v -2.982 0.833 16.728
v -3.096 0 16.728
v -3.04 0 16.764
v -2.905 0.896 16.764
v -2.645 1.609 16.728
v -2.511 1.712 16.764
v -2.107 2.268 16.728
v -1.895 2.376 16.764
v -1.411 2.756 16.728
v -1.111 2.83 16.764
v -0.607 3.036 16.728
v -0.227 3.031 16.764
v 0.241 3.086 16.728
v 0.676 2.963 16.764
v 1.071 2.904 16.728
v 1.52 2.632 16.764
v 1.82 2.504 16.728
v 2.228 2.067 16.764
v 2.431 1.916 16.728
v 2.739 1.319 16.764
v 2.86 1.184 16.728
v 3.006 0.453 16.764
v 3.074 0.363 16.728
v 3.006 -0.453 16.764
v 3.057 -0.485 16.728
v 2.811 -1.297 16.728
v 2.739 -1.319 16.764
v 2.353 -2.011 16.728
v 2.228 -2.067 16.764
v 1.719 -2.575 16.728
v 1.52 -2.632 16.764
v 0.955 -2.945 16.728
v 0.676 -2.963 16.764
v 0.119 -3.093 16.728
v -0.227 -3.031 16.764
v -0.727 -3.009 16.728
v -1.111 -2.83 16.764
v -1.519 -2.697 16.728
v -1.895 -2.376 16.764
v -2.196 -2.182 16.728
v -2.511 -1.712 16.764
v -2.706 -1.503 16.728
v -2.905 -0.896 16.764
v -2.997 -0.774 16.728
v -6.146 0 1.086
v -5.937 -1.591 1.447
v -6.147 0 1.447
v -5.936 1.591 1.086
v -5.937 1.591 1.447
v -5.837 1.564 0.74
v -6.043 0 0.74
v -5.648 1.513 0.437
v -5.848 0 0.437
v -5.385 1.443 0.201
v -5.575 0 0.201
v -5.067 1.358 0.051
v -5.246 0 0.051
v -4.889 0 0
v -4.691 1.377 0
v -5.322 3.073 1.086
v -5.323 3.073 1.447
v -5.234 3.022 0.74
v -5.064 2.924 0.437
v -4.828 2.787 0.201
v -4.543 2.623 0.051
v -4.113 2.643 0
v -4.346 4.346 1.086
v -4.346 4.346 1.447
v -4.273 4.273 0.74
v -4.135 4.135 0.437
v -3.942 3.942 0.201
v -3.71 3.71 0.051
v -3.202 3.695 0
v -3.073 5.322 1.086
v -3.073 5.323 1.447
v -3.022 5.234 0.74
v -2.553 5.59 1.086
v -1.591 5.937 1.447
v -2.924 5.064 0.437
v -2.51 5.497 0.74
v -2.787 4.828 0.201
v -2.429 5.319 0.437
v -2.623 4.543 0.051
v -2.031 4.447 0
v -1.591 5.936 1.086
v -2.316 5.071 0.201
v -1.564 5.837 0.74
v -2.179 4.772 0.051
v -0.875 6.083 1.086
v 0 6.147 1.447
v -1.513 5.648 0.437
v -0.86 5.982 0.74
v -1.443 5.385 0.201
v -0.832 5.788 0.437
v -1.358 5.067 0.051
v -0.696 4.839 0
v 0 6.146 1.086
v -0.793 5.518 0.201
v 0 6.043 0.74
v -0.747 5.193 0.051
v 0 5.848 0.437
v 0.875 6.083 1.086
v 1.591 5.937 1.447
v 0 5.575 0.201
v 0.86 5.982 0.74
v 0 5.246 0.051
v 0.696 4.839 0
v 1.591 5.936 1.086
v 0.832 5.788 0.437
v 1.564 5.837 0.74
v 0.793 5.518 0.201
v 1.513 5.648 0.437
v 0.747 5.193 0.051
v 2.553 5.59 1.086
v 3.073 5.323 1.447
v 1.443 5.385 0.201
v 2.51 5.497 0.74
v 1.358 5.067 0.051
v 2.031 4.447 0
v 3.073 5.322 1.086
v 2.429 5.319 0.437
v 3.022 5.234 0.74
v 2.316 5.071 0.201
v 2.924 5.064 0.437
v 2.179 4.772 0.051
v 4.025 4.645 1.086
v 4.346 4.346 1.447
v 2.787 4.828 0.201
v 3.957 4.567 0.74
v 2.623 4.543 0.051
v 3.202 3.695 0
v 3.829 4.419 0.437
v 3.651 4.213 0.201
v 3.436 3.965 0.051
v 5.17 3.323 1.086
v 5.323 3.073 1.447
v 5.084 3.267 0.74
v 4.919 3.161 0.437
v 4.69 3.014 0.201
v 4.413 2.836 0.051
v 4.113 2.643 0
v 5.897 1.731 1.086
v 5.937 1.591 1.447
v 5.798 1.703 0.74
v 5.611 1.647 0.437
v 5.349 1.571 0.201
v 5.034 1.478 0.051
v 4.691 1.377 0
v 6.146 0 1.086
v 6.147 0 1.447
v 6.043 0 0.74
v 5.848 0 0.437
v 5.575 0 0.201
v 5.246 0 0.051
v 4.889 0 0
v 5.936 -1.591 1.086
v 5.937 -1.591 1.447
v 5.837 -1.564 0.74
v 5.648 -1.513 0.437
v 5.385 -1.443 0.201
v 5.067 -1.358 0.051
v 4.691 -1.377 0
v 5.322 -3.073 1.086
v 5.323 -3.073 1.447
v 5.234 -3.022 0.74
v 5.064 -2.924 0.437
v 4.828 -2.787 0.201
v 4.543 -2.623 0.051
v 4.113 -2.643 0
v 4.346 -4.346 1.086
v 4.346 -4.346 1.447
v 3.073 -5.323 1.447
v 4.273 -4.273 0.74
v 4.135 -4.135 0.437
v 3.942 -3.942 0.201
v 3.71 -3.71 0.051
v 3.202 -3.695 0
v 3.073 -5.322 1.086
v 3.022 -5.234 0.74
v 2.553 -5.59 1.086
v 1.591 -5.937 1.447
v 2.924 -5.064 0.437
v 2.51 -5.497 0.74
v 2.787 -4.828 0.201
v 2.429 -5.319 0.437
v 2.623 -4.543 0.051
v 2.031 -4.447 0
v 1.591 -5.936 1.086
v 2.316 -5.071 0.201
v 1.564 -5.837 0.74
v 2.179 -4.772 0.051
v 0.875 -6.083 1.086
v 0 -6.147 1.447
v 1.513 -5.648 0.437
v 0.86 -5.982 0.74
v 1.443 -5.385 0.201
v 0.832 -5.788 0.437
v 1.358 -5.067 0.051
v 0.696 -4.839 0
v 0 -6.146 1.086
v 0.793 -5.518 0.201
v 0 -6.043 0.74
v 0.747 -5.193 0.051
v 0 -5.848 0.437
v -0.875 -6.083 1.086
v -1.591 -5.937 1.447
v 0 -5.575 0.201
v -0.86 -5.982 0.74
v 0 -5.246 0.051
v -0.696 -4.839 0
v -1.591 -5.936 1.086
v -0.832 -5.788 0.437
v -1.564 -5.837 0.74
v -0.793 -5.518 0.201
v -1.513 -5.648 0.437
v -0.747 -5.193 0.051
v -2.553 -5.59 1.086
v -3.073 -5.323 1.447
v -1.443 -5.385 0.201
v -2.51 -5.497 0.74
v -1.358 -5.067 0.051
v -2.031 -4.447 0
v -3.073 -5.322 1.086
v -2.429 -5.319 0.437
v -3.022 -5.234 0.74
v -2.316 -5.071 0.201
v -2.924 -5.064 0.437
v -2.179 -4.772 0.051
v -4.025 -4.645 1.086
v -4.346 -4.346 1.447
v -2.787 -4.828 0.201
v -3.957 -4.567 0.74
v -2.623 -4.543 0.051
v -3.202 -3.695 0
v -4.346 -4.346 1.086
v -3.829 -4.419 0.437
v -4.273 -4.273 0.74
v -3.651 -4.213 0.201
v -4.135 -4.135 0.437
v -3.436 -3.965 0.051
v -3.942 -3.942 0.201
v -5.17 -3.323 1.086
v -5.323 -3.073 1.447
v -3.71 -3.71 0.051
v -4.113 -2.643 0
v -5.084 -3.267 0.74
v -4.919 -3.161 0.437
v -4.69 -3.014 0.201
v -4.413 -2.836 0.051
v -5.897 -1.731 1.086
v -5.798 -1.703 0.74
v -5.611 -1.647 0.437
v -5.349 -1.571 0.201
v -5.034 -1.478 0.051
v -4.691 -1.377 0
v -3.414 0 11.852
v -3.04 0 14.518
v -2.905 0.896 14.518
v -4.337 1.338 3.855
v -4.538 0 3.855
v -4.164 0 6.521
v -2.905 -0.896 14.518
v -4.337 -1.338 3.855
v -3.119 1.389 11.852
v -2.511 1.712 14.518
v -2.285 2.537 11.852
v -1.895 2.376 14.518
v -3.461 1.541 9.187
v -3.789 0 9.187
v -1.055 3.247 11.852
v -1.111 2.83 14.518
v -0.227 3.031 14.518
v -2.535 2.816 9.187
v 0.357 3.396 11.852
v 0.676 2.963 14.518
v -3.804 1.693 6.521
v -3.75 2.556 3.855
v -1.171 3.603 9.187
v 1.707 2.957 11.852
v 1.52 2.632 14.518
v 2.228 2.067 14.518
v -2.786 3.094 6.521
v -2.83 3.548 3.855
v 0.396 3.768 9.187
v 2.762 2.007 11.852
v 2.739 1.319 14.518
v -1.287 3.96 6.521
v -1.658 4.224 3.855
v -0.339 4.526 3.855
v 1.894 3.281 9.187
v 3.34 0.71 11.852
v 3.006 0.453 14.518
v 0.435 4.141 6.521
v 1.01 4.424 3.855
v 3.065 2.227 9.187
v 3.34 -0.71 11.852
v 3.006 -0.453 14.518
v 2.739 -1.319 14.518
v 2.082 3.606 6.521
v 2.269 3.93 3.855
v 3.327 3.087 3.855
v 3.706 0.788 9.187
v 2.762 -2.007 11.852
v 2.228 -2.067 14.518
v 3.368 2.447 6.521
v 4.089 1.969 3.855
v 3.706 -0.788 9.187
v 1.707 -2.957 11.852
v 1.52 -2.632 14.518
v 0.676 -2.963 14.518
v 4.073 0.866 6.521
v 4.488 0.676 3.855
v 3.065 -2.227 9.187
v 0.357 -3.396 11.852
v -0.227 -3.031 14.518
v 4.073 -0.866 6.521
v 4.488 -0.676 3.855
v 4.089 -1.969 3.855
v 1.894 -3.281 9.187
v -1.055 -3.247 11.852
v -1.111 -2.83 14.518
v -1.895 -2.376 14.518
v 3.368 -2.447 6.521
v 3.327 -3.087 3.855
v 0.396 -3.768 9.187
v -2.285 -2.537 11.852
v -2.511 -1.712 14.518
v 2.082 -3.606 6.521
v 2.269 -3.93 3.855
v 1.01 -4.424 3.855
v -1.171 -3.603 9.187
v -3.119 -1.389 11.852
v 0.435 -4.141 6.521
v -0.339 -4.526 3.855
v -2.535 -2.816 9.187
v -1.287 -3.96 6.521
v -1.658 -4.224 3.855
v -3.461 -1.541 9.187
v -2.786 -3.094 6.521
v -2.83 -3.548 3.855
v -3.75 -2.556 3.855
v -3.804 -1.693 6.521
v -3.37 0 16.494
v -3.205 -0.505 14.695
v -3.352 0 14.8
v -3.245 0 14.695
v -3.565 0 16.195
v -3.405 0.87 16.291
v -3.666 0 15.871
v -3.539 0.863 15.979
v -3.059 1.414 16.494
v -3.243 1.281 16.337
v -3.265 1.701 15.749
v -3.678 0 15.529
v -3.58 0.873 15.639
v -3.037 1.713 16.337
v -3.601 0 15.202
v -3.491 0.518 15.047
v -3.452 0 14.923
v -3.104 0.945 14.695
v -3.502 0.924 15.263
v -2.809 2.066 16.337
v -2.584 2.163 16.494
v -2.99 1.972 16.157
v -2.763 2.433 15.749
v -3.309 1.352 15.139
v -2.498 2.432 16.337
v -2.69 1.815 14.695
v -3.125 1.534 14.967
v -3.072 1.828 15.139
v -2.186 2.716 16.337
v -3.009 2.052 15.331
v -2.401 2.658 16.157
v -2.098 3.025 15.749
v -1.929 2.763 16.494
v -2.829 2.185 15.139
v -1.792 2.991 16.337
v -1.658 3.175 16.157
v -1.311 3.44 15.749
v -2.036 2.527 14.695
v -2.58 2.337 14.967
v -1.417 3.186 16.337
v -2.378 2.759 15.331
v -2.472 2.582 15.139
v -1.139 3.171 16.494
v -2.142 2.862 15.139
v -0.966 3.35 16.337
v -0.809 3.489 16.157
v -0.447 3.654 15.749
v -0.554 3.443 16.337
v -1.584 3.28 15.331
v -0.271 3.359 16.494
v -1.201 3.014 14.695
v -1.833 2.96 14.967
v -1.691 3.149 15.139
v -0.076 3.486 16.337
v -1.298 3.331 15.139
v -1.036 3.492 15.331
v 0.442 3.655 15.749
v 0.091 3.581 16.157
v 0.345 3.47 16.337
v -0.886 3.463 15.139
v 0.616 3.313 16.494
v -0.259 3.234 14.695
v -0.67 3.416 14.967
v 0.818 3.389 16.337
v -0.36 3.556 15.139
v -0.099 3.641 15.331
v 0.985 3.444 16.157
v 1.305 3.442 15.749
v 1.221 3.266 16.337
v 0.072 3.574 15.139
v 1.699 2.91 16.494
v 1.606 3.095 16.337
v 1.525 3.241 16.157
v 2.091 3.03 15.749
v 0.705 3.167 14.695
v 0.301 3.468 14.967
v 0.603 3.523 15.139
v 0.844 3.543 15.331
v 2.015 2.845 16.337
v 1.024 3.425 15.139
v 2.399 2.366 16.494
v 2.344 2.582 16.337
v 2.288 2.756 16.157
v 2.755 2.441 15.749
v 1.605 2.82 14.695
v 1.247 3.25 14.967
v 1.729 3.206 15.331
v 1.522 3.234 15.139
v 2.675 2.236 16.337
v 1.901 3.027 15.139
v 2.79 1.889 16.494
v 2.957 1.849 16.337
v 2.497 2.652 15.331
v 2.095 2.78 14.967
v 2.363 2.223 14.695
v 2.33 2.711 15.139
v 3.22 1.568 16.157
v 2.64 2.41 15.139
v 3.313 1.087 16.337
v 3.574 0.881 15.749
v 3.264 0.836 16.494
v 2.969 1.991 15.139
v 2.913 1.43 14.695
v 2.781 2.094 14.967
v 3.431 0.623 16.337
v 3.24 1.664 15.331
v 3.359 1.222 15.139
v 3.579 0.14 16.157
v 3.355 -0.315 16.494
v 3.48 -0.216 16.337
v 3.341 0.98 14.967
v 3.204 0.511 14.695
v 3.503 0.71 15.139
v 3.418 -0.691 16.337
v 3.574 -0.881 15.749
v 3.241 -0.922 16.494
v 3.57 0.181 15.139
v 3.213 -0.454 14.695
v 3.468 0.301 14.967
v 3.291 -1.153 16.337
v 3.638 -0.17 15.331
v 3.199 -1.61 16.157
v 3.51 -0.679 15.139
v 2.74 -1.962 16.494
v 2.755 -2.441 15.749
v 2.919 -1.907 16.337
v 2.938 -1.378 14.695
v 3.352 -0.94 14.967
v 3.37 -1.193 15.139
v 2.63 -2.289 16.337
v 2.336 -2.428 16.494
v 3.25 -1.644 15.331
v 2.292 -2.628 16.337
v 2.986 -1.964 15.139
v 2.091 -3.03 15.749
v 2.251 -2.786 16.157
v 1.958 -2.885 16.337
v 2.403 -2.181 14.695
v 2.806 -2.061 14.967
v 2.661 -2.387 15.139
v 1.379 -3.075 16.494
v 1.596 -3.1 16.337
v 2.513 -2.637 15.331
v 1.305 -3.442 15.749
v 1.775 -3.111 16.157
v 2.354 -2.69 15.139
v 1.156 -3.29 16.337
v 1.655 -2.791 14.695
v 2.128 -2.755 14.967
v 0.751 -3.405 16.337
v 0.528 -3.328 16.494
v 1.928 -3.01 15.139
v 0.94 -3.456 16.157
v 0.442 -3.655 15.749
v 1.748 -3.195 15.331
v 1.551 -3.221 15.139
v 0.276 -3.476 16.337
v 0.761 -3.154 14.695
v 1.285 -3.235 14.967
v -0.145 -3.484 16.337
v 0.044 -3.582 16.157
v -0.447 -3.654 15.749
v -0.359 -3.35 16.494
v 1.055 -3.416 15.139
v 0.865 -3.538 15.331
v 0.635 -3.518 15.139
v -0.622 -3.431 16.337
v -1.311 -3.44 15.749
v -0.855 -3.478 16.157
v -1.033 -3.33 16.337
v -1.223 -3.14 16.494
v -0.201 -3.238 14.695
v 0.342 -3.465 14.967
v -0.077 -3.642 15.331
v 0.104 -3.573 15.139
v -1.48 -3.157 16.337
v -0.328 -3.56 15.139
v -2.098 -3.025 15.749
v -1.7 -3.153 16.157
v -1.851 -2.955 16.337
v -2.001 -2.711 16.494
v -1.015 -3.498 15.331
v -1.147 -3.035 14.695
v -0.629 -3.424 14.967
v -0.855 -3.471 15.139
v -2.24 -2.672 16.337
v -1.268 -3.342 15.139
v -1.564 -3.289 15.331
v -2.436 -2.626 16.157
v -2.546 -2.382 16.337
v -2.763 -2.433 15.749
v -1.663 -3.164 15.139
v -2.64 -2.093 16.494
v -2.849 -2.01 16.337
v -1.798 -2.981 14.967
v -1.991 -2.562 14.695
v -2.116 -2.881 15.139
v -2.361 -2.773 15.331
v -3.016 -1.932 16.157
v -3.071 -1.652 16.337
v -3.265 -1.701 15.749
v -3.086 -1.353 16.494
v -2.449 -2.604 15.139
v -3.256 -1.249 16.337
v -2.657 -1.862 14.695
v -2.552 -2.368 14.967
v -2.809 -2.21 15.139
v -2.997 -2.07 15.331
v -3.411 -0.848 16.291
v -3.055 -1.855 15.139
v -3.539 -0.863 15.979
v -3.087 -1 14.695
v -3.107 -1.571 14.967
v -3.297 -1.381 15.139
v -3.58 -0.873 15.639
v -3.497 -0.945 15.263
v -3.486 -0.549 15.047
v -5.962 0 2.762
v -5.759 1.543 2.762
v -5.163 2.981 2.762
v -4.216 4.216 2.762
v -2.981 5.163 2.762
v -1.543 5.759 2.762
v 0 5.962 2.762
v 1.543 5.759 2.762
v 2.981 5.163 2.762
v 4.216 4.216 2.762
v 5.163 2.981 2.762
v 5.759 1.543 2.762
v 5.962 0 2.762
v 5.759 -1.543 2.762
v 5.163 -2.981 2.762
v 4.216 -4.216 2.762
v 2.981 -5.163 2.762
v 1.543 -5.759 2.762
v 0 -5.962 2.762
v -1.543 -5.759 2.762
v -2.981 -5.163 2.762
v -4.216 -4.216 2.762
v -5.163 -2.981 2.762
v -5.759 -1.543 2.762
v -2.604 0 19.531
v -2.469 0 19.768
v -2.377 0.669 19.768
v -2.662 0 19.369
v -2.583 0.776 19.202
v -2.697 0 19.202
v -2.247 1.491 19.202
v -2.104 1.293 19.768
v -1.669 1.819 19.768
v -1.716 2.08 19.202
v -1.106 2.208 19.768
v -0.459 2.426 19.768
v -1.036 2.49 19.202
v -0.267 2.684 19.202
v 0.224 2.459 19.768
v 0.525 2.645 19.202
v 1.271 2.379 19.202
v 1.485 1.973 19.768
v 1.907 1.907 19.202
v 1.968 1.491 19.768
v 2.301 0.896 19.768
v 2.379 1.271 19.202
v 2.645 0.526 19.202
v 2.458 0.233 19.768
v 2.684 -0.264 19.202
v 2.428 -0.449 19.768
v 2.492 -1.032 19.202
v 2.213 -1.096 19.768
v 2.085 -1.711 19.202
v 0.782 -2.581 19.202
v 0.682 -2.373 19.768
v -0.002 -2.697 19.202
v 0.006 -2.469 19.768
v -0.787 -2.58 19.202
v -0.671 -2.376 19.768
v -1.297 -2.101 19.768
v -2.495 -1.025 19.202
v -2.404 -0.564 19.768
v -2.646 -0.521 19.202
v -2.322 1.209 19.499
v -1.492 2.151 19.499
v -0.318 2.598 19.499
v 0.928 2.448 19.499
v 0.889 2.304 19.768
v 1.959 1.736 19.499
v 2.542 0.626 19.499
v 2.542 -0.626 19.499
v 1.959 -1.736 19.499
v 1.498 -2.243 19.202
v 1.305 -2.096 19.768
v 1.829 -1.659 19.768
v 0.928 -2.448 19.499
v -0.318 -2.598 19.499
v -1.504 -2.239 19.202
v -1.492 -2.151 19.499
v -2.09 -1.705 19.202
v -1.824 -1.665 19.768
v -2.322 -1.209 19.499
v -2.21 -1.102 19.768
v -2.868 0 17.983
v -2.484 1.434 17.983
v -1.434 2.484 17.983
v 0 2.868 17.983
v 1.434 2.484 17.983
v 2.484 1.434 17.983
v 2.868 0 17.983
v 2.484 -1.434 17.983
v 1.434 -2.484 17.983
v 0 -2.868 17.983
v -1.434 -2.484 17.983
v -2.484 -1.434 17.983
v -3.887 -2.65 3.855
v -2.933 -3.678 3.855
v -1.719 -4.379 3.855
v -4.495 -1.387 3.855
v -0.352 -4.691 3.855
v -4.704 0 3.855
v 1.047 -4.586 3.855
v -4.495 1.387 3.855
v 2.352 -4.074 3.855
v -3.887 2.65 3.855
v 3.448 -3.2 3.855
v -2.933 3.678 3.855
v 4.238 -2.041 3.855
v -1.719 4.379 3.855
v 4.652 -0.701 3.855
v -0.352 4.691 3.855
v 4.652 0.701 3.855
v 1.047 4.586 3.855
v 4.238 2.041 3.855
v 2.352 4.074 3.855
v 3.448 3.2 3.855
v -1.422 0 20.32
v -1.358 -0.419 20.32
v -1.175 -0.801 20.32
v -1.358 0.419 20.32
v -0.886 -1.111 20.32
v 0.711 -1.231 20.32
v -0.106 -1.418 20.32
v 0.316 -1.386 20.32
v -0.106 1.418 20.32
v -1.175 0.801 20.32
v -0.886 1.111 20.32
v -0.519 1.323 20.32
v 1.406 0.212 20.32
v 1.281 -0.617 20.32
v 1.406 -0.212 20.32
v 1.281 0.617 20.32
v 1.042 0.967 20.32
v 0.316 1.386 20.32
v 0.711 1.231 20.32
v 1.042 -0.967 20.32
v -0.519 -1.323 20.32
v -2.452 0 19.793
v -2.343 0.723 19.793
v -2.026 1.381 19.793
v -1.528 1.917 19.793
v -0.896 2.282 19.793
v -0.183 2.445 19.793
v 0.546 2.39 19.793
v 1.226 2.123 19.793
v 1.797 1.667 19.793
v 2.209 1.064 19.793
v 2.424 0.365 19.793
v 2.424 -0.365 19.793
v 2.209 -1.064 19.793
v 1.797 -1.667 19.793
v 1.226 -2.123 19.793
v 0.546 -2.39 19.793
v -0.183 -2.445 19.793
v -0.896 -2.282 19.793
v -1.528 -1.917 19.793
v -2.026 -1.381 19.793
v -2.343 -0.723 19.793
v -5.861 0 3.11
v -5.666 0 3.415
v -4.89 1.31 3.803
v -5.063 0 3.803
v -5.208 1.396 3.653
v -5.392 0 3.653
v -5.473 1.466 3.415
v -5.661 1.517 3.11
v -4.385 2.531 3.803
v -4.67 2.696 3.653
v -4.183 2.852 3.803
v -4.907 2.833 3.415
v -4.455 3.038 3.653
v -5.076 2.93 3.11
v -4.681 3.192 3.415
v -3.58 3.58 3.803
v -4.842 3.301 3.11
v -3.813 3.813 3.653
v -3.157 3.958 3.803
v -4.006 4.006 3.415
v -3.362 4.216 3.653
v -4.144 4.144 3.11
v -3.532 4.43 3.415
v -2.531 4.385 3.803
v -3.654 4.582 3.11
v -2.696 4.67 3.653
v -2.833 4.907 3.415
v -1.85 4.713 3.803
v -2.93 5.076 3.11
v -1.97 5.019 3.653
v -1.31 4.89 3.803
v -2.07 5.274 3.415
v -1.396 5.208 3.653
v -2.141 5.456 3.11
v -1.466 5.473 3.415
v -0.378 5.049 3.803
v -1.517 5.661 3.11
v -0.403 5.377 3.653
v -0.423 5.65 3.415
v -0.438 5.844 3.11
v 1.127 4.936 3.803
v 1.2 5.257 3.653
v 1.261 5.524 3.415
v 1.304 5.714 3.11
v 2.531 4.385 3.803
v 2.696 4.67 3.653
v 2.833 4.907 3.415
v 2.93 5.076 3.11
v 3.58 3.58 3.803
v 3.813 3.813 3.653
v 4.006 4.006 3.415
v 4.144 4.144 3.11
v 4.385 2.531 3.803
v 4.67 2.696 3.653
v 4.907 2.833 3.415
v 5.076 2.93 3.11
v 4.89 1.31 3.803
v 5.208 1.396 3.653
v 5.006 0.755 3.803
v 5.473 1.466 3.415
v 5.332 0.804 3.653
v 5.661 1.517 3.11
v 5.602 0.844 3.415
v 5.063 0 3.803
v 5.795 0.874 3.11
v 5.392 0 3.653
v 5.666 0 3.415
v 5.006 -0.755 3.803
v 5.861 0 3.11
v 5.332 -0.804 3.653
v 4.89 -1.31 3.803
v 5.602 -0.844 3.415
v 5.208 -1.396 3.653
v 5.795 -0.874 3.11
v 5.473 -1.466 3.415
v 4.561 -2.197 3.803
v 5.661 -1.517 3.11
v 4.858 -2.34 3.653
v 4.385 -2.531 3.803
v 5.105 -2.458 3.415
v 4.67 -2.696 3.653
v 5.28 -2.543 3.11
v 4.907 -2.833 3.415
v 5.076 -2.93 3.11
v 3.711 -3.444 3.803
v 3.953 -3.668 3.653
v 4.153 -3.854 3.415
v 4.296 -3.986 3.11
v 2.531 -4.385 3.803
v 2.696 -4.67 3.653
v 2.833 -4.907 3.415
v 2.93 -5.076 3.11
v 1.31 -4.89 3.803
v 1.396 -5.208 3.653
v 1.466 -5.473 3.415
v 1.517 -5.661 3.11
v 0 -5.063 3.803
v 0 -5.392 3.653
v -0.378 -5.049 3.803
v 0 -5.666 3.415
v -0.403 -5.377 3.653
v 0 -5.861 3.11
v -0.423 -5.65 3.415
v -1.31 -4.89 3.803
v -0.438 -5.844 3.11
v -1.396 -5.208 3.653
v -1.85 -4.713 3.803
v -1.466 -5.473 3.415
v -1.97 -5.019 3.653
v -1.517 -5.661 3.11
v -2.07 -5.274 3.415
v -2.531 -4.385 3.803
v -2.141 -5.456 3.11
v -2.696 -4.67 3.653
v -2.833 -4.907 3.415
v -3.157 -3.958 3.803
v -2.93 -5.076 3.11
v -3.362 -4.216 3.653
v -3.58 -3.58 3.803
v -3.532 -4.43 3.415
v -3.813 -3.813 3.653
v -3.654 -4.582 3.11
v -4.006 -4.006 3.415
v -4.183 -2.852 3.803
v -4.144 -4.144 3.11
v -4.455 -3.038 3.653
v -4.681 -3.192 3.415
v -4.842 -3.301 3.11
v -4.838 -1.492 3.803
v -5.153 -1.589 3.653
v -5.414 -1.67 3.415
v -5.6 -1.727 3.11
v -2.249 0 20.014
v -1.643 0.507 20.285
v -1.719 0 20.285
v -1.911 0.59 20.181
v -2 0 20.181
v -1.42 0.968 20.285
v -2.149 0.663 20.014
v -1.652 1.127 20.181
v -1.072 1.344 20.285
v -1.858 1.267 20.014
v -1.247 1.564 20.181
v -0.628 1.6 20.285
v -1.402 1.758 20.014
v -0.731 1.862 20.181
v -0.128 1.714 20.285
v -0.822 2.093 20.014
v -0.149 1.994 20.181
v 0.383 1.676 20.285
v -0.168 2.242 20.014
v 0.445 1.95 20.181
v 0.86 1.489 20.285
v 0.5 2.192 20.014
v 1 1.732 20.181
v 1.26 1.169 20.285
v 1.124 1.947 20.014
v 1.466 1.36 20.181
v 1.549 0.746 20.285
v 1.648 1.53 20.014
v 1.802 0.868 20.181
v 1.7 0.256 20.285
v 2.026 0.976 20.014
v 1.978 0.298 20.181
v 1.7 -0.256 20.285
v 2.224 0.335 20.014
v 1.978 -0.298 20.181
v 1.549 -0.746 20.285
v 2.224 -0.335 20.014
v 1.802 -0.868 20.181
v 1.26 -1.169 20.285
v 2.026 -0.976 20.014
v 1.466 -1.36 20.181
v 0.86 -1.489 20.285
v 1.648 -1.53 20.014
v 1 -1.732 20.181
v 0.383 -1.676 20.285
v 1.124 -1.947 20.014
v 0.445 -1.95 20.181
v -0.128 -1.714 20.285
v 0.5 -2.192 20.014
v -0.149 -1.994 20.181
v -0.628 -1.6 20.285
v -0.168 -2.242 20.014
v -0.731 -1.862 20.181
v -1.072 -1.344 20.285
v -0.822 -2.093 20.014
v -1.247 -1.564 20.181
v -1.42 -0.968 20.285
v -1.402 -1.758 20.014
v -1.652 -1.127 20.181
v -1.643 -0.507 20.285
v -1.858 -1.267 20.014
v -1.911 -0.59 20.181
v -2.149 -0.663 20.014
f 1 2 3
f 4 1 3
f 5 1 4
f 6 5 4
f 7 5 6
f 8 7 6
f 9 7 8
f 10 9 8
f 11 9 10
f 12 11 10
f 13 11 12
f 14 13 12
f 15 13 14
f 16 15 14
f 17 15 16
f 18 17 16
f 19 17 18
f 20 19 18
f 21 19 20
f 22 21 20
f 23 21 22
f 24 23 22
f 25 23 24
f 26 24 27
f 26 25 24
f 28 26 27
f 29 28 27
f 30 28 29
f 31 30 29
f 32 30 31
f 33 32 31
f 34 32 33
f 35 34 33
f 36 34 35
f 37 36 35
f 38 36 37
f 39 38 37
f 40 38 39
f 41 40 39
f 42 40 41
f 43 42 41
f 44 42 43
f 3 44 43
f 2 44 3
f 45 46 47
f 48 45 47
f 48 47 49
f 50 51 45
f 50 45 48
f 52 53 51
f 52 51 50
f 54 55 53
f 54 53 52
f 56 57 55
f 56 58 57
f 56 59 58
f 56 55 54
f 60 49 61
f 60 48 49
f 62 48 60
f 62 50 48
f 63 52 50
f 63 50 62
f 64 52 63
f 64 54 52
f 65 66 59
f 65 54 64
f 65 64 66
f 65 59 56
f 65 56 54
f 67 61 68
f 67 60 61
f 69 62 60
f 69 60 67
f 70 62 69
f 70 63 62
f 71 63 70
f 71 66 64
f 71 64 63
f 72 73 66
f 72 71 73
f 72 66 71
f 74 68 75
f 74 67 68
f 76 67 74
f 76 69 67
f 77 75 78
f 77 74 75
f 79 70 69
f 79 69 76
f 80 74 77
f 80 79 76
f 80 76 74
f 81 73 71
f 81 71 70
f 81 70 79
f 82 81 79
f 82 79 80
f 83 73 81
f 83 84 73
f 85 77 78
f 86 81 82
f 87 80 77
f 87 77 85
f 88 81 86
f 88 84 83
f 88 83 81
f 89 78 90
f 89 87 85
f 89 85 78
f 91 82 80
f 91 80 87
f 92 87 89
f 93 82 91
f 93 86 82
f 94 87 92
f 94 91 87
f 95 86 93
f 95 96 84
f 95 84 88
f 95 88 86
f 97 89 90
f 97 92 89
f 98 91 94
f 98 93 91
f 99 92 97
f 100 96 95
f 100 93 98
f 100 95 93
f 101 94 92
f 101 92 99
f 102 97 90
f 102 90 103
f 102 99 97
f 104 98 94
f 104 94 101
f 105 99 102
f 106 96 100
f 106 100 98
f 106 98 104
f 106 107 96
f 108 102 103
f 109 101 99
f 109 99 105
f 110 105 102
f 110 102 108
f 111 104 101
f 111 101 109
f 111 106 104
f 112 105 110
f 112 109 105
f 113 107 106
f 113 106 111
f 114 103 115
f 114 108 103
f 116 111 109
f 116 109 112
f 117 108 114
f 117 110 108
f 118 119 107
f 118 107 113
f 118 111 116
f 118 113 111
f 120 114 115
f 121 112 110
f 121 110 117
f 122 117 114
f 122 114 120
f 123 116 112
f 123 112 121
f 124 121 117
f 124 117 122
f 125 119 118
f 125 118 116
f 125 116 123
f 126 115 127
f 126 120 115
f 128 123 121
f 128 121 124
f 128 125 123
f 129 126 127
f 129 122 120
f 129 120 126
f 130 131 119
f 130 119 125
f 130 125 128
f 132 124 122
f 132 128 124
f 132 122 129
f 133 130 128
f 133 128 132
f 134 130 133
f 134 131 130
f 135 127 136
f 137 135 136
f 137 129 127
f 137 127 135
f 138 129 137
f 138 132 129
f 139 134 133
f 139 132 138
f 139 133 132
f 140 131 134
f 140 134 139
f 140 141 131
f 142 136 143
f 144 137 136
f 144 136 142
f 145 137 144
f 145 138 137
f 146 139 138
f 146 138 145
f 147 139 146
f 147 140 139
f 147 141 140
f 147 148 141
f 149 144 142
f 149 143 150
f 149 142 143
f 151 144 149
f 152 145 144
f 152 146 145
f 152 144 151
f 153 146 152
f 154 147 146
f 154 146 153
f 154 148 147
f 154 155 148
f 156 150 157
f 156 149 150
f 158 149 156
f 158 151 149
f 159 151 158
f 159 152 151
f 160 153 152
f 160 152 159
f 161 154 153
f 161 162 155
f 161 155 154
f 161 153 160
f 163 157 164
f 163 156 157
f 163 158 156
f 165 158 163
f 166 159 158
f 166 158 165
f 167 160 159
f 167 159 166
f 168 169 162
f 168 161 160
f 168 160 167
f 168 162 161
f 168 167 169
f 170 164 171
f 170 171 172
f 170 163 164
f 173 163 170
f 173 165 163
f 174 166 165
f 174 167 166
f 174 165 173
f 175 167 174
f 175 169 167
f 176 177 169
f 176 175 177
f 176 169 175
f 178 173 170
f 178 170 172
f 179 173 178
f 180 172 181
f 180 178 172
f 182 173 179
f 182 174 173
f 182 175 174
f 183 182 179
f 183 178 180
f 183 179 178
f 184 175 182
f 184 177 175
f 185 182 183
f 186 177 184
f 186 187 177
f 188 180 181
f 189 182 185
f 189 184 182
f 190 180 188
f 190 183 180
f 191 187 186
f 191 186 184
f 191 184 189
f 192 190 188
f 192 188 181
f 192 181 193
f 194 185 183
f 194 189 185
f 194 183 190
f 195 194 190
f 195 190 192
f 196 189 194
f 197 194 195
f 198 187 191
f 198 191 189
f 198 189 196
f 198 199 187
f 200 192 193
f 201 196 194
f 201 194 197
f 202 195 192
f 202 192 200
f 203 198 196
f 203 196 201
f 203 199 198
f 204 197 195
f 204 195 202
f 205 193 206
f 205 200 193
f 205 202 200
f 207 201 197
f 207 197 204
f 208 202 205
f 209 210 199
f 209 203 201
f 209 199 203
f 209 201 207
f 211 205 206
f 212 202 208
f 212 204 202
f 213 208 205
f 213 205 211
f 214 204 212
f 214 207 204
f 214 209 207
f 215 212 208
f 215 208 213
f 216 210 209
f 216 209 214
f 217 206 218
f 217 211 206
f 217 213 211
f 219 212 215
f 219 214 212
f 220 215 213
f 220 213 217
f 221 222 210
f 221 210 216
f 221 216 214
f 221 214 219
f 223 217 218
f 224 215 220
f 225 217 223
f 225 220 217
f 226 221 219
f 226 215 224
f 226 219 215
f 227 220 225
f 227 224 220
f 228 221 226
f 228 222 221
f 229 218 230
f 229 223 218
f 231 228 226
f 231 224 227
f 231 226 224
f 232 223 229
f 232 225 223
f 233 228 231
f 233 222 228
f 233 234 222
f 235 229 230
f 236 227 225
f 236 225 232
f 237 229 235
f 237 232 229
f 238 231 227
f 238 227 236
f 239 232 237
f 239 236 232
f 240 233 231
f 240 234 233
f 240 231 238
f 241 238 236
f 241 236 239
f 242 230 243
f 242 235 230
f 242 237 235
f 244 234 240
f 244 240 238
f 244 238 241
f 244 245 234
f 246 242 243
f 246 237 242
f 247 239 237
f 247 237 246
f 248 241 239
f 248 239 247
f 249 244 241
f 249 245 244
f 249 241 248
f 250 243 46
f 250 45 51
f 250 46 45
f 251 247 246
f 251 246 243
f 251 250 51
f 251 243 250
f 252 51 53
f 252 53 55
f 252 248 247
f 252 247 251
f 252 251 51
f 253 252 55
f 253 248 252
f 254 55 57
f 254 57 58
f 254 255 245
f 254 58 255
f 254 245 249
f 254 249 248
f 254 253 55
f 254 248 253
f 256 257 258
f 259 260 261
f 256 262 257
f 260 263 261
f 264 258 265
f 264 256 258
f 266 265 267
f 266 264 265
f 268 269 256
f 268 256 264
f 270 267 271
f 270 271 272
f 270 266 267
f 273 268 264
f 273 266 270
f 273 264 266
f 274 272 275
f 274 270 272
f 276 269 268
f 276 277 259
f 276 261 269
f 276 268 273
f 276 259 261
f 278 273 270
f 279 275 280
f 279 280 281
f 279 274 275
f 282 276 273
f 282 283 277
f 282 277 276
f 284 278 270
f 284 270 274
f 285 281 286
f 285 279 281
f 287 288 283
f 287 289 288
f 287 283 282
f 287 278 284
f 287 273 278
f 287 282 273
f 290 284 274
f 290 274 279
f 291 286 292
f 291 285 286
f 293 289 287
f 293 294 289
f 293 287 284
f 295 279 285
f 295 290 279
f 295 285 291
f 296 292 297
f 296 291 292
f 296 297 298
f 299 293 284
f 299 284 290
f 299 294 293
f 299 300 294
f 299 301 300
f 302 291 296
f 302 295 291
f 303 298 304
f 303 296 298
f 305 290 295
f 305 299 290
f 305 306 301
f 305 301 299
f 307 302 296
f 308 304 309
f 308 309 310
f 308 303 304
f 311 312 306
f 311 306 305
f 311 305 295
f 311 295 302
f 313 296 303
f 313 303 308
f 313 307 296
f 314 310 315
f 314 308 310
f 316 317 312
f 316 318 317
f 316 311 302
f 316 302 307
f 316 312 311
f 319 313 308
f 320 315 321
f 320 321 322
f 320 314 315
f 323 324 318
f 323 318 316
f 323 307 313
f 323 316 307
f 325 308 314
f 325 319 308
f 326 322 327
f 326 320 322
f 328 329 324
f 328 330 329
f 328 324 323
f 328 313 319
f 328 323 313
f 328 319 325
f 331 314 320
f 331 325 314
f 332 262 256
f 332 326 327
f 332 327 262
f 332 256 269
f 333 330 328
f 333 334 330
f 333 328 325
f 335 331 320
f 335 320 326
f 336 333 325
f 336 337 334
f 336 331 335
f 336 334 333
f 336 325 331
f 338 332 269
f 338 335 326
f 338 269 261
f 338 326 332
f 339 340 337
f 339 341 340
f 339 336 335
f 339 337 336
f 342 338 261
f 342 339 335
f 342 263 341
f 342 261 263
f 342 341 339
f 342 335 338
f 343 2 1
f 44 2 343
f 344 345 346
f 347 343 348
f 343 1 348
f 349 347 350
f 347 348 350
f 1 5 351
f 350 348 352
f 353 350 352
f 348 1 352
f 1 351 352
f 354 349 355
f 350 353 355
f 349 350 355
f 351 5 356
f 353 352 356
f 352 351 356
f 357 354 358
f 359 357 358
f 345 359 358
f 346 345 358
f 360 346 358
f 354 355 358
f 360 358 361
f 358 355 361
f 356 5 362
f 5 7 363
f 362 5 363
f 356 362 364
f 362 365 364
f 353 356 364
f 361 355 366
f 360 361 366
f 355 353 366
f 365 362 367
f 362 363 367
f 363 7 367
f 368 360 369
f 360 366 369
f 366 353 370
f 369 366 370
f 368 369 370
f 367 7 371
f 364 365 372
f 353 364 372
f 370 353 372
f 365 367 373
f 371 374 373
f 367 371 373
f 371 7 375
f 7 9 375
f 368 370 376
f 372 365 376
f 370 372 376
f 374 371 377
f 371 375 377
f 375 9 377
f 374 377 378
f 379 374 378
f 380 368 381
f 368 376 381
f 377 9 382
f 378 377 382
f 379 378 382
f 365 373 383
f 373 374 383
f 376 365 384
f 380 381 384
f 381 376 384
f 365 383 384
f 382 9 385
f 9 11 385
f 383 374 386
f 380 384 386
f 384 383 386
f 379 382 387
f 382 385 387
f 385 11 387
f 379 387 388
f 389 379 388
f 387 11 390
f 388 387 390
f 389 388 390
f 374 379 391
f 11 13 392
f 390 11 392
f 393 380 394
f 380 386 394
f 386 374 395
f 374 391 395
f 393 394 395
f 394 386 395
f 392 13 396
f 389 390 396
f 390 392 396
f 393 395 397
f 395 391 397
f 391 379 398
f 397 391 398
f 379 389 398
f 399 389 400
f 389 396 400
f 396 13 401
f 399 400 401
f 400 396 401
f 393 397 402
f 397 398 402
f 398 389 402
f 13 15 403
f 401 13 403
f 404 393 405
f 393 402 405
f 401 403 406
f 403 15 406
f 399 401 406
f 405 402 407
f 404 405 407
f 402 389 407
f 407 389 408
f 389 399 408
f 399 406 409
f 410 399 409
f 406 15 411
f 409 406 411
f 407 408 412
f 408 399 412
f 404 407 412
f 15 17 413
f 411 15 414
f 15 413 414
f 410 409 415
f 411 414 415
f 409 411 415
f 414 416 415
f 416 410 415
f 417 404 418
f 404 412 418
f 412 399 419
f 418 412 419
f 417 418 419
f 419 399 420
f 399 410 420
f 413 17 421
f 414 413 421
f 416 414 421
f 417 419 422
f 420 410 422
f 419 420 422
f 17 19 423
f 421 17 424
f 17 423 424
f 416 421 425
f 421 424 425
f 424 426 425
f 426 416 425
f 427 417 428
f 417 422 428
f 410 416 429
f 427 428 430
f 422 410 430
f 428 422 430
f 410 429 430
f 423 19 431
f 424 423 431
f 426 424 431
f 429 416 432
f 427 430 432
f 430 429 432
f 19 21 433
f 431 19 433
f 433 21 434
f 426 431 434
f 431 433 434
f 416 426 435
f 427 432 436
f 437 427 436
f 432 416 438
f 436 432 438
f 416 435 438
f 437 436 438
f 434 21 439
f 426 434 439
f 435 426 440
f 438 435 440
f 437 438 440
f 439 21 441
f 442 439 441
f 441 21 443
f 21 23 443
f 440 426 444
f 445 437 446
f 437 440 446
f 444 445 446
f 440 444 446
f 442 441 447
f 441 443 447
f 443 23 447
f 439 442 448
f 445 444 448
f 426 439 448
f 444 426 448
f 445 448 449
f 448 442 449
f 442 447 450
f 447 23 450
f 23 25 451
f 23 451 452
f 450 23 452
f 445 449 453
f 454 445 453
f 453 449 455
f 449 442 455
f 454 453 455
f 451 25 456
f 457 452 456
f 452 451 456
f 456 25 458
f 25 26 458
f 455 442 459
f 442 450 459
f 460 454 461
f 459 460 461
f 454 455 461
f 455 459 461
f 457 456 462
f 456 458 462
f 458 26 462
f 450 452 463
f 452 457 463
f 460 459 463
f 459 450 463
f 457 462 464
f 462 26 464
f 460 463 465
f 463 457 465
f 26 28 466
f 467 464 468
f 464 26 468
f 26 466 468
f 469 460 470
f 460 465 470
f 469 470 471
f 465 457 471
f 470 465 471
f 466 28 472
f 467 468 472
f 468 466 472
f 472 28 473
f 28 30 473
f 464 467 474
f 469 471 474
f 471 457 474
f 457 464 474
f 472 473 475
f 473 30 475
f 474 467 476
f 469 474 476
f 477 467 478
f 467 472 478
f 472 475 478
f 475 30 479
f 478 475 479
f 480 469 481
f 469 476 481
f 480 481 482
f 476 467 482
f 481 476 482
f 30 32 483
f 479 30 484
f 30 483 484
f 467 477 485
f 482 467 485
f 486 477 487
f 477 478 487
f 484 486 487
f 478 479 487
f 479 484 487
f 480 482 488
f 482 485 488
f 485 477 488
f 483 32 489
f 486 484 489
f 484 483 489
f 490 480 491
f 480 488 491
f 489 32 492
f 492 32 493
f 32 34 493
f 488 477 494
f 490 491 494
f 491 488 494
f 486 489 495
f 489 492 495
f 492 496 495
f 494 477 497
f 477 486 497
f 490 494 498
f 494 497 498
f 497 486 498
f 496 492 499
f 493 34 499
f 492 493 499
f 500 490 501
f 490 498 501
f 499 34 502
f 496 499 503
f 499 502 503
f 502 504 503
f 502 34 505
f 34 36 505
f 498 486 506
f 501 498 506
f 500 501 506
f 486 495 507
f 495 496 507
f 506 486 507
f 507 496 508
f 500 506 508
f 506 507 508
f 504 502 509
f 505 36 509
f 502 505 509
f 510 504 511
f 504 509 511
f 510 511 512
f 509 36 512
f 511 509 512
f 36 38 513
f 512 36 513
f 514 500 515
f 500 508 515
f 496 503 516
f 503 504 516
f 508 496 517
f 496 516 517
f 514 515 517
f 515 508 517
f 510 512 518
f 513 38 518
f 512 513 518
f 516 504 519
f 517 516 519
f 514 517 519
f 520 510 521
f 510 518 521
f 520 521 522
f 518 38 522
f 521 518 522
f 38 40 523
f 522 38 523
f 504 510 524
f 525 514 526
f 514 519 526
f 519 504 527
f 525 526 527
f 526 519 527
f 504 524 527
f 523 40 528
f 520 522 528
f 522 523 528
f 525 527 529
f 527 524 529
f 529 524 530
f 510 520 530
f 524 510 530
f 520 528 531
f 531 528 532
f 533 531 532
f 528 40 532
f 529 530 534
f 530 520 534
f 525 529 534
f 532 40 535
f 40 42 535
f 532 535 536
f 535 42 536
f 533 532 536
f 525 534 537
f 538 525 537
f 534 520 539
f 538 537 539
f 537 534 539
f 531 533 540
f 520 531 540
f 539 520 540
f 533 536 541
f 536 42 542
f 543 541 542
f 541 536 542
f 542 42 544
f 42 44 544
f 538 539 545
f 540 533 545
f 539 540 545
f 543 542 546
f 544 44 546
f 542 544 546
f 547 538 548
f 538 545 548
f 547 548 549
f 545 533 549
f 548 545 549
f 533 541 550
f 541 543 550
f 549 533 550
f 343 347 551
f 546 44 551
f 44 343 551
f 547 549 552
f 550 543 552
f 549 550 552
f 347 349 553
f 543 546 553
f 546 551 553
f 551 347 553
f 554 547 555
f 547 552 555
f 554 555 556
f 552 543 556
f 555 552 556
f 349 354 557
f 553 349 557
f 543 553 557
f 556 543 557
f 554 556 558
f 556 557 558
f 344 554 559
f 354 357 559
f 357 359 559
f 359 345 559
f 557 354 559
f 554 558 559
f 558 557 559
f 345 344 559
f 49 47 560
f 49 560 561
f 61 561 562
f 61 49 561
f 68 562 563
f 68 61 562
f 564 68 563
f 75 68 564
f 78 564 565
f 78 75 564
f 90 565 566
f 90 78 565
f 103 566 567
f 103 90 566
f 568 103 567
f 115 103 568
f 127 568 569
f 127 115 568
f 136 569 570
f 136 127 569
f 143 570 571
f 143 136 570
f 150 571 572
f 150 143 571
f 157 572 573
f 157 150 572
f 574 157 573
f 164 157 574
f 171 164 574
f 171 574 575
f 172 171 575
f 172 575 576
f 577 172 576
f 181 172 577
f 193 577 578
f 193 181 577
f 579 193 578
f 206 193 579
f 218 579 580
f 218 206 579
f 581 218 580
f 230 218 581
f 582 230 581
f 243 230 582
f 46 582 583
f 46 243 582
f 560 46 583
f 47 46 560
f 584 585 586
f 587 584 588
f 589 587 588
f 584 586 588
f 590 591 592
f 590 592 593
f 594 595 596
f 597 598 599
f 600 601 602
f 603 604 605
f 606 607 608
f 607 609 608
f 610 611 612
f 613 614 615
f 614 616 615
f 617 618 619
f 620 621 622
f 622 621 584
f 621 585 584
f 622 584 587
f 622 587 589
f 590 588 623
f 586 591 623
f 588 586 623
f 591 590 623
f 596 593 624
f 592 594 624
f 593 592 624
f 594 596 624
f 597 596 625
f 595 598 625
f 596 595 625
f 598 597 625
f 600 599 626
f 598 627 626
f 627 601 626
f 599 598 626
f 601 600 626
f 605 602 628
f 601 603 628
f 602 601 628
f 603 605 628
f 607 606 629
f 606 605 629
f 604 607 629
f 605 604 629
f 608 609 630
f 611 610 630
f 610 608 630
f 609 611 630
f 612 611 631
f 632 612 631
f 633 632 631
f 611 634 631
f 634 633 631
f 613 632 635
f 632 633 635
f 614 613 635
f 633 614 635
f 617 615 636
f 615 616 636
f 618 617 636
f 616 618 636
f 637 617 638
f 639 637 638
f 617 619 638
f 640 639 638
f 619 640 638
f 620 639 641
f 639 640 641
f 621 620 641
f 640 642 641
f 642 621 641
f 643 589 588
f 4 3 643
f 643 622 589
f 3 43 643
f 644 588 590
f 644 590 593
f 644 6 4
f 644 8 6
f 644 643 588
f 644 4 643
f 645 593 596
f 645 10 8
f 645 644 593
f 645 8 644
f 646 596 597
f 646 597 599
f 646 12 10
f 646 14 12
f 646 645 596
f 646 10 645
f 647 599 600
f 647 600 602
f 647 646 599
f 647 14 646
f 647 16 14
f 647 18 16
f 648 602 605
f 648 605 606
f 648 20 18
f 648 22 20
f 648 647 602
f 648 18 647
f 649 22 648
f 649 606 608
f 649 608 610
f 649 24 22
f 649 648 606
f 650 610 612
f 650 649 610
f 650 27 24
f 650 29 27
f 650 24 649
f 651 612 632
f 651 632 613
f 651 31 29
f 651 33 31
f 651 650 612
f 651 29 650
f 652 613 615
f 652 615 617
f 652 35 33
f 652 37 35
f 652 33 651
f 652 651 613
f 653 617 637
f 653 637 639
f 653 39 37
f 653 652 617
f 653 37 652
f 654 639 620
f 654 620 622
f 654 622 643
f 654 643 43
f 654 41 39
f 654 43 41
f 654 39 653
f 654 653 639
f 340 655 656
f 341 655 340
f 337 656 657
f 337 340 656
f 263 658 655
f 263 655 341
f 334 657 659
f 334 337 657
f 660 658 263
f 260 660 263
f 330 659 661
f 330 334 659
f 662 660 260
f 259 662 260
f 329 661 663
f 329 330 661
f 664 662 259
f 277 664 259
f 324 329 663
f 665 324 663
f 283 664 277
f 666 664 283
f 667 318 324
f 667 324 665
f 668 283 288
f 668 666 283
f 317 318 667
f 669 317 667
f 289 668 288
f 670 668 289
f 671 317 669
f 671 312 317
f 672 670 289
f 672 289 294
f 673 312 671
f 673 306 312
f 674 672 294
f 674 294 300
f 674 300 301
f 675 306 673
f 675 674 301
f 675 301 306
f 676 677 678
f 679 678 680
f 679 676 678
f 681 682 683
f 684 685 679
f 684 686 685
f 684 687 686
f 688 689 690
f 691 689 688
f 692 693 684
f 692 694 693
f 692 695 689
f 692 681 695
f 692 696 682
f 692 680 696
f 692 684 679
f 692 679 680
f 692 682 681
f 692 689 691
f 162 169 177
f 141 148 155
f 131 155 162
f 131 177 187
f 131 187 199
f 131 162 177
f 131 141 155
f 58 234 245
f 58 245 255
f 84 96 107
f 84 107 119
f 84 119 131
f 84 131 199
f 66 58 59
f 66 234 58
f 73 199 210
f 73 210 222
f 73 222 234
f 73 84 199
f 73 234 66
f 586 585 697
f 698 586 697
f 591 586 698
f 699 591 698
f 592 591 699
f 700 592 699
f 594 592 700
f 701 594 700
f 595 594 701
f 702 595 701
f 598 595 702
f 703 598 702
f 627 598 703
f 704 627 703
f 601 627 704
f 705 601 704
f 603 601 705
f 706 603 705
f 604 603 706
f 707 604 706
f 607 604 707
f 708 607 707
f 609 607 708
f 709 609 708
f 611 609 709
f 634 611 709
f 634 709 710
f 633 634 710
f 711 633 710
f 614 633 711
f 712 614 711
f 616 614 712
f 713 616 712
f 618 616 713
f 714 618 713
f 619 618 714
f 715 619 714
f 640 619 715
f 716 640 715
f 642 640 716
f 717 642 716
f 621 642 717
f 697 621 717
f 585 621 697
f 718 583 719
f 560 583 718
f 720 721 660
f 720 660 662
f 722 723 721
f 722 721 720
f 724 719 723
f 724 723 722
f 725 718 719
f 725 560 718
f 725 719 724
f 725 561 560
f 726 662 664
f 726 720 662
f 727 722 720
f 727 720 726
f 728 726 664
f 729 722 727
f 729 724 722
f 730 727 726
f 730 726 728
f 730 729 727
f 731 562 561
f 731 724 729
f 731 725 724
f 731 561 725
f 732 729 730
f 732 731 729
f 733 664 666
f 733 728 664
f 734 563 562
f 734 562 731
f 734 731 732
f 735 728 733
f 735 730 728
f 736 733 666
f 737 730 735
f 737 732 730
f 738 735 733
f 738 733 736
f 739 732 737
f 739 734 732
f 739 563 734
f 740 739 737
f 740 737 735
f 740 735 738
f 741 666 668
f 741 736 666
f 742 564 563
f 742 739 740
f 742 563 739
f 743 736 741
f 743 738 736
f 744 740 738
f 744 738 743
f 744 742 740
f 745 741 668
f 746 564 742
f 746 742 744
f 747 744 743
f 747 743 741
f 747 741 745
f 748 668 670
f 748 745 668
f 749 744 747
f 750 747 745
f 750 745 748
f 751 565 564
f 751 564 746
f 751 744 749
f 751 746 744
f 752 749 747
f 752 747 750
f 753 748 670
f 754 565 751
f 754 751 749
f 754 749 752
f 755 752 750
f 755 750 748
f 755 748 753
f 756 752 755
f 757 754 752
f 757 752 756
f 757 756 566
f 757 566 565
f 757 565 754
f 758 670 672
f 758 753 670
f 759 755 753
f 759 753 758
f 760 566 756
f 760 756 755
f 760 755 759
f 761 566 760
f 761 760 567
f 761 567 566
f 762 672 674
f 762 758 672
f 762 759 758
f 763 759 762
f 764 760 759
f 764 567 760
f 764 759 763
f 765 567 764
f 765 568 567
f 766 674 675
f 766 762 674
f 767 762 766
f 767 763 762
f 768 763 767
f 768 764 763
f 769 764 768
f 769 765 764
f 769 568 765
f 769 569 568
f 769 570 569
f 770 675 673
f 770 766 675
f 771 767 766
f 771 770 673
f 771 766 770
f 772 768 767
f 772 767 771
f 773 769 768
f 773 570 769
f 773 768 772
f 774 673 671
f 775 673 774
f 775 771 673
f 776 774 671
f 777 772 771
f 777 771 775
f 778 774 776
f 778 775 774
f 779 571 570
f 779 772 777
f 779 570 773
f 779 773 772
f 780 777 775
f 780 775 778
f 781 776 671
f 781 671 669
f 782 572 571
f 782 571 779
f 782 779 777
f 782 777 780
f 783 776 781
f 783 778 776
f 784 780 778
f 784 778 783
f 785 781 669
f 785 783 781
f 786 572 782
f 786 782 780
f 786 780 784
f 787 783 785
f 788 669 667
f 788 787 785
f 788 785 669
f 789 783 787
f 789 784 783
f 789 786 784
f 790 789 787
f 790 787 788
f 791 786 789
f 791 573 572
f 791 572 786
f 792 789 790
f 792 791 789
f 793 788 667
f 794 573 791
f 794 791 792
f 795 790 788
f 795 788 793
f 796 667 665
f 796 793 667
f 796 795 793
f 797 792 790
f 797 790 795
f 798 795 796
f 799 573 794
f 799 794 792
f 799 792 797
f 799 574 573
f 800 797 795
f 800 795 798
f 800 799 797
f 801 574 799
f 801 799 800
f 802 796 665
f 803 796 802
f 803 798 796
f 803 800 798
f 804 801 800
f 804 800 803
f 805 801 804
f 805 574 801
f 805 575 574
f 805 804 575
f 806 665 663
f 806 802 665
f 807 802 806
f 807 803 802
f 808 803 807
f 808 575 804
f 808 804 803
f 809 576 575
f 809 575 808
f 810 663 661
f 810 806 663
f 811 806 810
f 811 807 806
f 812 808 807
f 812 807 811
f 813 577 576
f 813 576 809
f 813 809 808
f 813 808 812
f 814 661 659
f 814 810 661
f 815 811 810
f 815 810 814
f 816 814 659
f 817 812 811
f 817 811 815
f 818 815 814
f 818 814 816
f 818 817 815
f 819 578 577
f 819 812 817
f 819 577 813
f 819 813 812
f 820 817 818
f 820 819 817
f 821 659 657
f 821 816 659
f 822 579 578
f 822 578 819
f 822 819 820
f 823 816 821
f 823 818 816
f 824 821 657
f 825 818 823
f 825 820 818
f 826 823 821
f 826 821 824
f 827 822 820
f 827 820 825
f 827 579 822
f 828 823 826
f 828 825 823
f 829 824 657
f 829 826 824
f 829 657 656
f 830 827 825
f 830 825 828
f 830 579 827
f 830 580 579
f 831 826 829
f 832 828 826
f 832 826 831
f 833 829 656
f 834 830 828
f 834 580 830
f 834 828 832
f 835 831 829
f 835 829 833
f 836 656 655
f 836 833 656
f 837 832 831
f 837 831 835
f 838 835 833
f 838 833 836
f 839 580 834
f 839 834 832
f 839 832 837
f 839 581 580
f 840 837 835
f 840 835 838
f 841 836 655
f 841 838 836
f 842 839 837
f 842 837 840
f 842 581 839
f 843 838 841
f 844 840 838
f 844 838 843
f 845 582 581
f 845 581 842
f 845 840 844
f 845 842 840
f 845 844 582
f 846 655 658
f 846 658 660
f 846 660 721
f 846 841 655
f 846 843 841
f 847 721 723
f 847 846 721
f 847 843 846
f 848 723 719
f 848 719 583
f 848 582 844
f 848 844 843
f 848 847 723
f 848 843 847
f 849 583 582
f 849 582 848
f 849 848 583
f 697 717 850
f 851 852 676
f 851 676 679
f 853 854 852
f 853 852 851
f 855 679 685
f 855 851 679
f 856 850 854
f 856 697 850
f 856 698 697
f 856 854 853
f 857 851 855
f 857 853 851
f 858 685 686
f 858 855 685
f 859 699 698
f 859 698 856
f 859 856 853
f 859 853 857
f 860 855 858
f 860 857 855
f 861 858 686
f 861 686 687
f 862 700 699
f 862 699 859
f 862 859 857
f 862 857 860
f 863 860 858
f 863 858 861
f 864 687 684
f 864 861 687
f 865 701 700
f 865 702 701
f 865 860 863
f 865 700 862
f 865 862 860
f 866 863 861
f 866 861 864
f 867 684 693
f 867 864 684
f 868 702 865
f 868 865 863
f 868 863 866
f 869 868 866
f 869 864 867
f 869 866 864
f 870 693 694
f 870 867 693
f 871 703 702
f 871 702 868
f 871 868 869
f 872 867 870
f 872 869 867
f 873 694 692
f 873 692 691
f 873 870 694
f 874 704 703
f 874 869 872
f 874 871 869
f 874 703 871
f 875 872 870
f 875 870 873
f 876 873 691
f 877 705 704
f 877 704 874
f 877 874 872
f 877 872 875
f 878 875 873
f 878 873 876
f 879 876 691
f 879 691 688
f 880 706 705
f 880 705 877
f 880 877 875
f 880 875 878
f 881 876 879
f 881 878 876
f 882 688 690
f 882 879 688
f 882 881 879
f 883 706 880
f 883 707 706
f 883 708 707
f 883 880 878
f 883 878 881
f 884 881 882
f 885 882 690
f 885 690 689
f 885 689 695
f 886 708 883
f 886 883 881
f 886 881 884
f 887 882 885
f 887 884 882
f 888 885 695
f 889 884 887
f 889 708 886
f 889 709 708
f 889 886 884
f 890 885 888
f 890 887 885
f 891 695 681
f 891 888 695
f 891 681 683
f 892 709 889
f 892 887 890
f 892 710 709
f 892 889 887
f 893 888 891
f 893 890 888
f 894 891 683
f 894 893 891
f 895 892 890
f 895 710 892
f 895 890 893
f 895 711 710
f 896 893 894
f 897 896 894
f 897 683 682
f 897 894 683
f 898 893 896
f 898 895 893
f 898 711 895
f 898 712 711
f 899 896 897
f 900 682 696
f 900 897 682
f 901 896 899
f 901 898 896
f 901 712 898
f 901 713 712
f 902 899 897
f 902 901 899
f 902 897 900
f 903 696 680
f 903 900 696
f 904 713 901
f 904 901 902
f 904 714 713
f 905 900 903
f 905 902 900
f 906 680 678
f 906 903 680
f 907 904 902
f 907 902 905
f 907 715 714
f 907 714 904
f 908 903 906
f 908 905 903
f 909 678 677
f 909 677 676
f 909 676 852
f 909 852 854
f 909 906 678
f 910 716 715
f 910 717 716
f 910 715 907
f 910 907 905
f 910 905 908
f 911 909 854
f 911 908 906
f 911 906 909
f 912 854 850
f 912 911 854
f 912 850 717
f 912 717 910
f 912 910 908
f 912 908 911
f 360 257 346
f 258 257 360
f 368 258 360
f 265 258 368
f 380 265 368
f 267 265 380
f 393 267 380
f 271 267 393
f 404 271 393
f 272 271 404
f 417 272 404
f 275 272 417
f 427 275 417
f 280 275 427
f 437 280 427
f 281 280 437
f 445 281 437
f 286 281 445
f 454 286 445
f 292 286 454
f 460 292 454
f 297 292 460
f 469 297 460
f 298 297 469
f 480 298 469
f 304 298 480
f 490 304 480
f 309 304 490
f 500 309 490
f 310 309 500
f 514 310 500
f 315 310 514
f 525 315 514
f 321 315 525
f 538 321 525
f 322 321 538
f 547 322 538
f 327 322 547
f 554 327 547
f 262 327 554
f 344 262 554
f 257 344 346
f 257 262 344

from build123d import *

# Parameters (mm, degrees)
F2_R = 1.27
F3_R = 1.27


with BuildPart() as f1:
    # F0 (on Front) → F1 (revolve)
    with BuildSketch(Plane.XZ):
        Polygon((-5.8082070693, 3.8550570151), (-6.35, 0), (0, 0), (0, 20.32), (-2.071337691, 20.32), (-2.6532195265, 19.5133350633), (-3.0396357876, 16.7638404987), (-4.5382070693, 15.8119048065), (-3.0396357876, 14.5179457392), (-4.5382070693, 3.8550570151), align=None)
    revolve(axis=Axis((0, 0, 10.16), (0, 0, -1)))

    # F2
    f2_edges = [f1.edges().sort_by_distance(p)[0] for p in [
        (2.071338, 0, 20.32),
        (2.65322, 0, 19.513335),
        (-2.362279, 0, 19.916668),
    ]]
    fillet(f2_edges, radius=F2_R)

    # F3
    f3_edges = [f1.edges().sort_by_distance(p)[0] for p in [
        (5.808207, 0, 3.855057),
        (1.421509, 0, 20.32),
        (4.538207, 0, 15.811905),
        (6.35, 0, 0),
    ]]
    fillet(f3_edges, radius=F3_R)


solid = f1.part
